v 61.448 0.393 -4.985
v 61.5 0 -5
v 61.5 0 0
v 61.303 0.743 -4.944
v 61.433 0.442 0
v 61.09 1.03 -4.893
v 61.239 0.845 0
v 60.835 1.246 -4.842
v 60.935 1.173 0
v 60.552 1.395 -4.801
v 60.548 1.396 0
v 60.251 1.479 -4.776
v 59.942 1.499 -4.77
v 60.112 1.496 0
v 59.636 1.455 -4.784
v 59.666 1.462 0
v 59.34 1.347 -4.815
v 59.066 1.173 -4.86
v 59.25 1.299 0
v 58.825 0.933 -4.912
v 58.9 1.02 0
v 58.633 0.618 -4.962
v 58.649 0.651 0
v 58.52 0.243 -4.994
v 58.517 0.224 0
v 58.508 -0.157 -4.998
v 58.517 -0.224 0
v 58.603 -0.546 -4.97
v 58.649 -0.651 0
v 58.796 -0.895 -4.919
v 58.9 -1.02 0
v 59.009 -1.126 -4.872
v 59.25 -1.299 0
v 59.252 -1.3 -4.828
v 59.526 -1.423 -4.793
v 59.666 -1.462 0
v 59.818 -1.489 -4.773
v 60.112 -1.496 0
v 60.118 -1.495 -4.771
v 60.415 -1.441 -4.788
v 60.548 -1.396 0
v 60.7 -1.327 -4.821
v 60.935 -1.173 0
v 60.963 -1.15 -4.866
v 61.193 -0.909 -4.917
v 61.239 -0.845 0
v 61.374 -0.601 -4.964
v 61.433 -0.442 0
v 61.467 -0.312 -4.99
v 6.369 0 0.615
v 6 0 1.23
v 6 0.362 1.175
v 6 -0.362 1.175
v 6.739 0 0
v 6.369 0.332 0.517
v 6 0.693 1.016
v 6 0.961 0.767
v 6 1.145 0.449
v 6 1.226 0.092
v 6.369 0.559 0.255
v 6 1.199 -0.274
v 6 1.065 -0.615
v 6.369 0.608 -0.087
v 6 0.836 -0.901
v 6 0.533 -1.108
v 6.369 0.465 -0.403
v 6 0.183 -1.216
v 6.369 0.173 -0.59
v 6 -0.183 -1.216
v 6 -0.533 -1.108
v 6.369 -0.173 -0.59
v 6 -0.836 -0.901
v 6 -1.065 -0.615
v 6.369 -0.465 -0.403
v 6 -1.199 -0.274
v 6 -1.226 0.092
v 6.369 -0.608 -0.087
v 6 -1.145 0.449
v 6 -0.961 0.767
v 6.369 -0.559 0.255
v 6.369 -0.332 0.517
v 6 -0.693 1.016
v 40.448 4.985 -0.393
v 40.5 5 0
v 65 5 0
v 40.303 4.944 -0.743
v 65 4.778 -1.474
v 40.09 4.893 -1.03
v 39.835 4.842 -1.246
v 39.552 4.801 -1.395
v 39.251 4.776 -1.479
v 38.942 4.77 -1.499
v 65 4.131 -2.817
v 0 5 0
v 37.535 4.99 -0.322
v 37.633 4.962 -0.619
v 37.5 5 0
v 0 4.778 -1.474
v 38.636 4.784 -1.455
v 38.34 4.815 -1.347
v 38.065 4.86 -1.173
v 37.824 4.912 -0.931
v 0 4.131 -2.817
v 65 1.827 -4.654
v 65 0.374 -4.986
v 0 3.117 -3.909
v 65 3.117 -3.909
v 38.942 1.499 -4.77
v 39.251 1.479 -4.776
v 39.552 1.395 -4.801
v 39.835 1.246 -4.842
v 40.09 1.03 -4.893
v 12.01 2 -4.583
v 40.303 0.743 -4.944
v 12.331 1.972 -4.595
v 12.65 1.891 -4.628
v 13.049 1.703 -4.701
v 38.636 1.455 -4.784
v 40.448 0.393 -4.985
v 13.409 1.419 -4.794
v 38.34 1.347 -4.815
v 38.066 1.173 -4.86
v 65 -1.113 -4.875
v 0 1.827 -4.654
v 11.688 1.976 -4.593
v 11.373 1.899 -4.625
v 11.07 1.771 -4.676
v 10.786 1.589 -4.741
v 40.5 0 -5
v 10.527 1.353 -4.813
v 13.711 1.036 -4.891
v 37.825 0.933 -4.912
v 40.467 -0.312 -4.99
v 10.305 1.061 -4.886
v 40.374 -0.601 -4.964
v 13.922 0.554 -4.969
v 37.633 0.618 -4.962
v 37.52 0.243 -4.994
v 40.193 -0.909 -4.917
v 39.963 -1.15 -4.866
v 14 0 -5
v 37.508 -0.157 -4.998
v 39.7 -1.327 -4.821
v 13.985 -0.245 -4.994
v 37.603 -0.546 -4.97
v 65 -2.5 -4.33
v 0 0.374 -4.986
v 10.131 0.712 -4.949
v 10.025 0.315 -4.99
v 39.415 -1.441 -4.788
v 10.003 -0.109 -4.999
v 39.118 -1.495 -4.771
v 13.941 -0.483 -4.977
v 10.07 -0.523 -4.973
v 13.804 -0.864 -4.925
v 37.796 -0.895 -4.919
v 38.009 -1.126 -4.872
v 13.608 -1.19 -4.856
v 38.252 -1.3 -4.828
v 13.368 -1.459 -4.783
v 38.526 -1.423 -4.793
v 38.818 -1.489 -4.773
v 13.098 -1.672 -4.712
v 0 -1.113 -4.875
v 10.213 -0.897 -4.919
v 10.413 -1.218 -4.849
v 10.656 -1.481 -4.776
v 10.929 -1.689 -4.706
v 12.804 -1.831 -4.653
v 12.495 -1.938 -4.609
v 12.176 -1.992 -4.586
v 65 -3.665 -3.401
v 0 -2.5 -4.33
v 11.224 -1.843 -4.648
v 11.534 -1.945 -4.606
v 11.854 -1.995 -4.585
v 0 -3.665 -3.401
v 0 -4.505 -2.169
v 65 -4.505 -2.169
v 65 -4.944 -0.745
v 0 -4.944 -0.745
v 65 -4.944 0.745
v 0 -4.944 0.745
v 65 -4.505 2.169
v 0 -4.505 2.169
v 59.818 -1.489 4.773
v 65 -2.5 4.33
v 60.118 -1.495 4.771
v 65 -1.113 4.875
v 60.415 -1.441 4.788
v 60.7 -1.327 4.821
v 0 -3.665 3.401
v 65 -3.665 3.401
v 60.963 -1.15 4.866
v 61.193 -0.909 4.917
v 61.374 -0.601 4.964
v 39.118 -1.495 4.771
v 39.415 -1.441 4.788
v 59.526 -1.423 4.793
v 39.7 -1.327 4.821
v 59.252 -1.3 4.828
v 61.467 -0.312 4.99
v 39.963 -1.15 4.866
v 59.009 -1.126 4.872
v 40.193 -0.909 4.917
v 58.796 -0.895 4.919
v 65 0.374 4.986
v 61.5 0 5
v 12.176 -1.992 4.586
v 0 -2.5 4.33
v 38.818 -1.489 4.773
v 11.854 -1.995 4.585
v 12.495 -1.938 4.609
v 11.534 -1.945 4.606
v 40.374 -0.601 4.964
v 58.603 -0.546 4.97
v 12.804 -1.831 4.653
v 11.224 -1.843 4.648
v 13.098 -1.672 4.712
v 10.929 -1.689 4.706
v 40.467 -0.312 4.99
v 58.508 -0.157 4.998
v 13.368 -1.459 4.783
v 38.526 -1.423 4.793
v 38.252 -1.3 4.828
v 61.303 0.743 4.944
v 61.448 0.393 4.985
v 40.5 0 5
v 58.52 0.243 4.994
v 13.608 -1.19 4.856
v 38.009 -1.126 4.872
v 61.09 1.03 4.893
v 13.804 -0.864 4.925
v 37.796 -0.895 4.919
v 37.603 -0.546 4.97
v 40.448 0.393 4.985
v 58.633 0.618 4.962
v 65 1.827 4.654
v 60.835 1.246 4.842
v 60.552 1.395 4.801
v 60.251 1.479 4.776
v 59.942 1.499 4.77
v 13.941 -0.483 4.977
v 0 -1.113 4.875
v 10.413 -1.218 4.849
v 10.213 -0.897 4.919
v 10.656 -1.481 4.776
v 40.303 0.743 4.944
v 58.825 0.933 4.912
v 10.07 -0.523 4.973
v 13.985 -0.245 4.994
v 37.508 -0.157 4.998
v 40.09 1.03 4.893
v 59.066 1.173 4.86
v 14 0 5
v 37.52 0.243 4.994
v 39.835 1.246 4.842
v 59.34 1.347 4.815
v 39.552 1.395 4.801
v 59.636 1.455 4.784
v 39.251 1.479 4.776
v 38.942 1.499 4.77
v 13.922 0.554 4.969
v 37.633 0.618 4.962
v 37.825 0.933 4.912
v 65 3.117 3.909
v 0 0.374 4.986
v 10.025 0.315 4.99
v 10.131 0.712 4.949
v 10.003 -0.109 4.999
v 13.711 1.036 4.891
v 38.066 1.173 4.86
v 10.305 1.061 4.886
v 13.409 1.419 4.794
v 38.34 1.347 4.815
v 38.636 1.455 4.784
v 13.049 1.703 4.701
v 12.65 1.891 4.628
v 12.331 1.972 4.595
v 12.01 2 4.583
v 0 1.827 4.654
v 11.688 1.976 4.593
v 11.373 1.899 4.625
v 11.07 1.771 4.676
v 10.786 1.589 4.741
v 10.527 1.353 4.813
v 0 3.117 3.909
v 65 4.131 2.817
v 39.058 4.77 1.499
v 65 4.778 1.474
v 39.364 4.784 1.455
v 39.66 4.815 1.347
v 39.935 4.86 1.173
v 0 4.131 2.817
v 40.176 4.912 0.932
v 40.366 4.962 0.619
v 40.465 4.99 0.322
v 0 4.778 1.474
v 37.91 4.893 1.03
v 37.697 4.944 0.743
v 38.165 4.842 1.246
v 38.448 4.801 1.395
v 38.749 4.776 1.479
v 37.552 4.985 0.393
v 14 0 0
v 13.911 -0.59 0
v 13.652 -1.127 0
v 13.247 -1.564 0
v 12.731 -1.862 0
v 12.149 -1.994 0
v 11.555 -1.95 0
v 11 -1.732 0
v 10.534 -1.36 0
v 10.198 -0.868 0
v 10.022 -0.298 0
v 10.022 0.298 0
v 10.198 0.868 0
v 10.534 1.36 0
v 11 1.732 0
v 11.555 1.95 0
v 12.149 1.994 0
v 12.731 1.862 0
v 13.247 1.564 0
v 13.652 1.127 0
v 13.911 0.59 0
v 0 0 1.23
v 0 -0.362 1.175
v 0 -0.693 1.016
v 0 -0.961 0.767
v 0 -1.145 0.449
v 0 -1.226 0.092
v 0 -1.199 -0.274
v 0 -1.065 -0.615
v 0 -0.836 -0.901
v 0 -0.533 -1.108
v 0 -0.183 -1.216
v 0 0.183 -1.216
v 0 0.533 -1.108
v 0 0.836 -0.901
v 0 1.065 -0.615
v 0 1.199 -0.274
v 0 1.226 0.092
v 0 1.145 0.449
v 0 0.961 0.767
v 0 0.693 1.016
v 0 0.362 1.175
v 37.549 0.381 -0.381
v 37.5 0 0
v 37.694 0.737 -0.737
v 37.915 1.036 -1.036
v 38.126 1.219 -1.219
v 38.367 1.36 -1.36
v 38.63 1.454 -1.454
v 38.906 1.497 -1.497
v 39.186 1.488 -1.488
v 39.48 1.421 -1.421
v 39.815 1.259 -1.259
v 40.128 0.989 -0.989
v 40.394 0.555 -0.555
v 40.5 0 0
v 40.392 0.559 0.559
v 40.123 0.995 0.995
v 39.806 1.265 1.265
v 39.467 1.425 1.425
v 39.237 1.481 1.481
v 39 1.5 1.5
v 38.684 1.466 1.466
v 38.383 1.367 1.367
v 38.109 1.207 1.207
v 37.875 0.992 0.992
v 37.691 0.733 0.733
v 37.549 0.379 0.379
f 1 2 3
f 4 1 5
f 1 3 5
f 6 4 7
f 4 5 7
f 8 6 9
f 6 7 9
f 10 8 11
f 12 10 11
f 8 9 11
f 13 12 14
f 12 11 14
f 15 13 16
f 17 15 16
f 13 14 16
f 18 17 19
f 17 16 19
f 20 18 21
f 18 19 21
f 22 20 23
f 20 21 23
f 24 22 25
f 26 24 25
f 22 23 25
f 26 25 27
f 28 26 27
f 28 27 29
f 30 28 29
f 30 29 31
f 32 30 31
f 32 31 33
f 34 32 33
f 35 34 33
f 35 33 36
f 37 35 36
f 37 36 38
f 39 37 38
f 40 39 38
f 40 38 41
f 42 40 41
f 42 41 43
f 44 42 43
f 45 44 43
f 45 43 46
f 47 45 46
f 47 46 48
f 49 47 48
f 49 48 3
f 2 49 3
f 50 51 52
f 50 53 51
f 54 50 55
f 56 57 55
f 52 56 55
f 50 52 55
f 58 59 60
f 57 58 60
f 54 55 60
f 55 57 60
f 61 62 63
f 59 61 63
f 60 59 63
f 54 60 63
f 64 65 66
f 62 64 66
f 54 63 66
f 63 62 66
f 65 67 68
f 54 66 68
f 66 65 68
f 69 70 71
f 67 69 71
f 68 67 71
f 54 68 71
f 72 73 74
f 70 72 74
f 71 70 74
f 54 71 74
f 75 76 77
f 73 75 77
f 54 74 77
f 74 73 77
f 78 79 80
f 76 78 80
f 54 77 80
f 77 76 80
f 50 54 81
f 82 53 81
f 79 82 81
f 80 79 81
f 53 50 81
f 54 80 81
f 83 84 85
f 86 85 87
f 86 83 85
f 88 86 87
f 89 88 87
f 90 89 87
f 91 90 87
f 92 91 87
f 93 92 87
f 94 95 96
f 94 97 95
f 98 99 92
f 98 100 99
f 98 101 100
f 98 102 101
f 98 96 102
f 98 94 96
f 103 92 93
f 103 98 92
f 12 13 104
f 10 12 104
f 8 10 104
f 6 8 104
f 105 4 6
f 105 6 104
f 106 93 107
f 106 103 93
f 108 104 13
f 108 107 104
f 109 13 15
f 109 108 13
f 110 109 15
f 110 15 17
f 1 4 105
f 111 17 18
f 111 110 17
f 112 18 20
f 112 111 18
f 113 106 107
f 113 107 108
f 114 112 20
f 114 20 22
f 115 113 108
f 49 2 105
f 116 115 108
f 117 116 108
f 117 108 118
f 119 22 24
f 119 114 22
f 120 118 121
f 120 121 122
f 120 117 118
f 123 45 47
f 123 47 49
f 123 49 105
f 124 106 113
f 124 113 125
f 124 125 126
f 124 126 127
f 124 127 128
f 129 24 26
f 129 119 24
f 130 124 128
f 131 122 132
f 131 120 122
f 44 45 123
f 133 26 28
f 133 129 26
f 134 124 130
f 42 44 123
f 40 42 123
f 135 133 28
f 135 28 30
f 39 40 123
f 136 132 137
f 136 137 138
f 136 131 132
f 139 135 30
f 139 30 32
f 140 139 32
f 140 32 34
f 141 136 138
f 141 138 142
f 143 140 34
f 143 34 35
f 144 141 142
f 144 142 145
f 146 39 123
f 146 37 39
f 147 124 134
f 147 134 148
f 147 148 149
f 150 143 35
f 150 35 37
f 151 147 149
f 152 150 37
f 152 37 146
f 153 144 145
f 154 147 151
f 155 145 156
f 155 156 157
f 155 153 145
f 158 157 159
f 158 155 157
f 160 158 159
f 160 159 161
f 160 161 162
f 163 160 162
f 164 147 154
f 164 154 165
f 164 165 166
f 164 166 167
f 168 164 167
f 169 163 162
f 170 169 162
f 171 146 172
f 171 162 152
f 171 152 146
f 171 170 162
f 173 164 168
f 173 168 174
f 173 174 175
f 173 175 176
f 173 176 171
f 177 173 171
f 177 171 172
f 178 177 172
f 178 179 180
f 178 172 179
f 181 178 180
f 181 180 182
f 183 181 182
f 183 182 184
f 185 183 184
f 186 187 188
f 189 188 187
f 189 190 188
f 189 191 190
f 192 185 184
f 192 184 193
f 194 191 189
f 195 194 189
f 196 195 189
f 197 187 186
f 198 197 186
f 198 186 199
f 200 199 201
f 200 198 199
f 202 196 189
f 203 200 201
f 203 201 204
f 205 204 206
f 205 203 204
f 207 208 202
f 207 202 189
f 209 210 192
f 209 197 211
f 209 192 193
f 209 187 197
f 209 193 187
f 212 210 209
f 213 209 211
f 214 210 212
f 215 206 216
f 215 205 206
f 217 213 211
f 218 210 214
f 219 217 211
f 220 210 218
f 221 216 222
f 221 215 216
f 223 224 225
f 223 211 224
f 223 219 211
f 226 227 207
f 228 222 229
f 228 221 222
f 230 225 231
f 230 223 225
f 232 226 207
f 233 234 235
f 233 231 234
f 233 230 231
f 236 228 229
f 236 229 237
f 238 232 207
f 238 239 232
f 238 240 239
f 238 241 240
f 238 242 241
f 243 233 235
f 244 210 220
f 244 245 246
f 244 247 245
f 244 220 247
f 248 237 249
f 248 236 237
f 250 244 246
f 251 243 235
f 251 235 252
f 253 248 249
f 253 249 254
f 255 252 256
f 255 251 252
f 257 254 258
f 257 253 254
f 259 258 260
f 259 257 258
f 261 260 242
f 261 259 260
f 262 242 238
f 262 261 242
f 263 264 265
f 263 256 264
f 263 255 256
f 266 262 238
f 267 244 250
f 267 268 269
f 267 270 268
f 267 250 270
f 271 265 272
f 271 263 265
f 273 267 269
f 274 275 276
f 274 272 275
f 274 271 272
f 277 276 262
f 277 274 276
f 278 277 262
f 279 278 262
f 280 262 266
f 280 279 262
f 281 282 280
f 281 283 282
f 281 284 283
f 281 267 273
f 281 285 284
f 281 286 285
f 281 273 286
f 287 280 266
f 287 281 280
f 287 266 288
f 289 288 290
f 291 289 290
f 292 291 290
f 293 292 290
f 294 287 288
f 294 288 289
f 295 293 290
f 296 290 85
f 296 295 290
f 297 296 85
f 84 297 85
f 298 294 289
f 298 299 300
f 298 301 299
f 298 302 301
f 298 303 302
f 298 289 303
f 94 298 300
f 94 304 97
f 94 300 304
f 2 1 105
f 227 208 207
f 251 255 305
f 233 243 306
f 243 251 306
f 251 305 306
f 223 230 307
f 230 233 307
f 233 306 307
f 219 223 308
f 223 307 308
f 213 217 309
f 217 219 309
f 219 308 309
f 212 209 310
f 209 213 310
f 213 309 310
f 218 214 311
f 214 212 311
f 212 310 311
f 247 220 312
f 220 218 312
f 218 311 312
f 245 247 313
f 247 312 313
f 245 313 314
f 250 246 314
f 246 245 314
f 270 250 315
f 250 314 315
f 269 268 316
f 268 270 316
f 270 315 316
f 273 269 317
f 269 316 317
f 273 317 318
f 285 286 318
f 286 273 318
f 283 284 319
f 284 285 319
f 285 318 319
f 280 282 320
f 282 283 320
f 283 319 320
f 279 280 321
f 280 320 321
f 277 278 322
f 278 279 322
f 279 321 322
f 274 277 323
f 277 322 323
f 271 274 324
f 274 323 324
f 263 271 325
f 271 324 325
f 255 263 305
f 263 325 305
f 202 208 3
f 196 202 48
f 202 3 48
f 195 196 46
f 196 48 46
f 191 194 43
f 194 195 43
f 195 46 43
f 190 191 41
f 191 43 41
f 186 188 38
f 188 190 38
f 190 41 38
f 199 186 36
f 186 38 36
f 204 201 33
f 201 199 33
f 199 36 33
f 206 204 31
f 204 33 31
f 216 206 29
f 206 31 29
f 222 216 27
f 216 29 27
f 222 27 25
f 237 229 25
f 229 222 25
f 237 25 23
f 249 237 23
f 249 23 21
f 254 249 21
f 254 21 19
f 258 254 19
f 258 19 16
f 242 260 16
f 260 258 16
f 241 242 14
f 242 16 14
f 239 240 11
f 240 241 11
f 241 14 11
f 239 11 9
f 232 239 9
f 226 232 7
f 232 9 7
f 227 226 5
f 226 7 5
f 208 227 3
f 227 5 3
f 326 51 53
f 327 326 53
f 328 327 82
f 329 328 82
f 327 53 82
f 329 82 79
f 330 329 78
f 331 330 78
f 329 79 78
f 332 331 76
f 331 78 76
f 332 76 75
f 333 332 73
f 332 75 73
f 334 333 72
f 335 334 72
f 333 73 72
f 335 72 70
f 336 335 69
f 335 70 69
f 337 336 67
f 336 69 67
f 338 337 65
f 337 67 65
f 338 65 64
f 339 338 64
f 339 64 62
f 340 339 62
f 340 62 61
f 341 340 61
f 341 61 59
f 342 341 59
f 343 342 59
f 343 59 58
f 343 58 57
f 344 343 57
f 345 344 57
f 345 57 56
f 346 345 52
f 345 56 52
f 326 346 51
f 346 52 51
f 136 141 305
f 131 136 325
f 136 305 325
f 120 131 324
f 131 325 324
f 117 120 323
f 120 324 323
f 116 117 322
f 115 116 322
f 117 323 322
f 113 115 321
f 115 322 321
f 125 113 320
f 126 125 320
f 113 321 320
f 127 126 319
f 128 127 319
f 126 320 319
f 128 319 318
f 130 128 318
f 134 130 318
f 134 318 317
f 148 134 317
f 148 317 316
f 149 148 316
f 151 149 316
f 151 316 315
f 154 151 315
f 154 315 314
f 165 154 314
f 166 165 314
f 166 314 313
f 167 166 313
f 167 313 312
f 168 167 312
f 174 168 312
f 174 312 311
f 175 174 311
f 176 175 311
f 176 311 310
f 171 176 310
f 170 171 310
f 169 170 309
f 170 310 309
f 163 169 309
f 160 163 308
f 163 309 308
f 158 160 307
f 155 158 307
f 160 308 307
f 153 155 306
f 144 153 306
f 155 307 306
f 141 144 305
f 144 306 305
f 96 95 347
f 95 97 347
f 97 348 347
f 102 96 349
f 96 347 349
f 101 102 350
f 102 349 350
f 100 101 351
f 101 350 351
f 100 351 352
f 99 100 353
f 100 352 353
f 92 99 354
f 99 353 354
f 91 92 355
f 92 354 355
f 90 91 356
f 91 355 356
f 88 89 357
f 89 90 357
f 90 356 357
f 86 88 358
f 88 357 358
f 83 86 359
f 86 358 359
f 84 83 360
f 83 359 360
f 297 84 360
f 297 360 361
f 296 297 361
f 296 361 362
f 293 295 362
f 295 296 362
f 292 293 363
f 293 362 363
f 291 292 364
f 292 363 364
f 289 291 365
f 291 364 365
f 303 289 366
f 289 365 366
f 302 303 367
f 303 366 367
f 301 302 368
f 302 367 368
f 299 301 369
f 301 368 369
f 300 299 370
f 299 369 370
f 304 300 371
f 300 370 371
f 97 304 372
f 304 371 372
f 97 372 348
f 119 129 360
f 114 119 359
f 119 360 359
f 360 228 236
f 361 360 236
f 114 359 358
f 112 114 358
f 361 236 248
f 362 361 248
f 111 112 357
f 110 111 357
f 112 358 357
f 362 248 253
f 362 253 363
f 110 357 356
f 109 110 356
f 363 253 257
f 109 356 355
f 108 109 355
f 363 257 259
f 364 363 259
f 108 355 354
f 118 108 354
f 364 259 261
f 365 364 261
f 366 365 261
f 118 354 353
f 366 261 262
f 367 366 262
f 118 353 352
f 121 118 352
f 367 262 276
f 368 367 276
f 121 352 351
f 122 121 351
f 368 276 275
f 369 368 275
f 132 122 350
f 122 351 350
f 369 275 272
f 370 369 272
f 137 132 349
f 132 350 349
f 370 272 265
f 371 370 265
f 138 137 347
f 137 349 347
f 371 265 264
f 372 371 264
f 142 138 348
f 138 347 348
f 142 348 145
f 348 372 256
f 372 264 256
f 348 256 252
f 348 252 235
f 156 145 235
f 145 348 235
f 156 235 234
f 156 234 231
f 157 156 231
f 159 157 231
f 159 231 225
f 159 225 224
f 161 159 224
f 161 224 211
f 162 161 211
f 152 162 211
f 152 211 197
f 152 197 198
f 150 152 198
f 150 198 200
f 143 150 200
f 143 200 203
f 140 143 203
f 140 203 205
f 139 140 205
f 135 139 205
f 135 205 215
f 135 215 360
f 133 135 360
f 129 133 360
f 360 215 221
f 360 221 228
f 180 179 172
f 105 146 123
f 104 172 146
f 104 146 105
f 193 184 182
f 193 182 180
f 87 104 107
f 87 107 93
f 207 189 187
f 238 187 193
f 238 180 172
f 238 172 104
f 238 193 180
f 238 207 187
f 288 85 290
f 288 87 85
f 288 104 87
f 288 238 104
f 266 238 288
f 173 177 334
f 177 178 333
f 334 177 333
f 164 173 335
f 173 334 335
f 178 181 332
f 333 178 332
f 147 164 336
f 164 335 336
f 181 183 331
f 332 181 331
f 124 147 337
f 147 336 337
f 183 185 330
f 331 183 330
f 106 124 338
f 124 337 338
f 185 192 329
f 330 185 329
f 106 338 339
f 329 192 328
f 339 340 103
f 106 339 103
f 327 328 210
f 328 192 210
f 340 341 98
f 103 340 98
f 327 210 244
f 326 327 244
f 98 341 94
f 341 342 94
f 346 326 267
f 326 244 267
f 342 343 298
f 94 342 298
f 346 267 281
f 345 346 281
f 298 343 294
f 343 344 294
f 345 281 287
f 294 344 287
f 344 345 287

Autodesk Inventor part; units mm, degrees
ref_plane "YZ Plane" through (0, 0, 0) normal (1, 0, 0) x (0, 1, 0)
ref_plane "XZ Plane" through (0, 0, 0) normal (0, 1, 0) x (-1, 0, 0)
ref_plane "XY Plane" through (0, 0, 0) normal (0, 0, 1) x (1, 0, 0)
sketch "Эскиз1" plane through (0, 0, 0) normal (1, 0, 0) x (0, 1, 0)
  circle A0 centre (0, 0) radius 5
  dimension "d0" = 10
extrude "Выдавливание1" add sketch "Эскиз1" along normal blind 65
sketch "Эскиз2" plane through (0, 0, 0) normal (0, 0, 1) x (1, 0, 0)
  line L0 (0, 0) -> (12, 0)
  circle A0 centre (12, 0) radius 2
  line L1 (12, 0) -> (29, 0)
  line L2 (29, 0) -> (39, 0)
  circle A1 centre (39, 0) radius 1.5
  dimension "d3" = 12
  dimension "d4" = 4
  dimension "d5" = 17
  dimension "d6" = 10
  dimension "d7" = 3
extrude "Выдавливание2" cut sketch "Эскиз2" along normal mid plane 15.25
sketch "Эскиз3" plane through (0, 0, 0) normal (0, 1, 0) x (-1, 0, 0)
  line L0 (-40.5, -5) -> (-40.5, 5) projected
  line L1 (-37.5, -5) -> (-37.5, 5) projected
  line L2 (-37.5, 0) -> (-40.5, 0)
  circle A0 centre (-39, 0) radius 1.5
  point P0 (0, 0)
  dimension "d10" = 3
extrude "Выдавливание3" cut sketch "Эскиз3" along normal blind 15
thread "Резьба1" size "M3x0.5" class "6H" standard "ISO Metric profile" full length
thread "Резьба2" size "M3x0.5" class "6H" standard "ISO Metric profile" full length
sketch "Эскиз4" plane through (0, 0, 0) normal (0, 0, 1) x (1, 0, 0)
  line L0 (65, -5) -> (65, 5) projected
  line L1 (65, 0) -> (60, 0)
  circle A0 centre (60, 0) radius 1.5
  point P0 (0, 0)
  dimension "d17" = 5
  dimension "d18" = 3
extrude "Выдавливание4" cut sketch "Эскиз4" along normal mid plane 21.25
thread "Резьба3" size "M3x0.5" class "6H" standard "ANSI Metric M Profile" full length
sketch "Эскиз5" plane through (0, 0, 0) normal (-1, 0, 0) x (0, 0, 1)
  point P0 (0, 0)
  point P1 (0, 0)
hole "Отверстие1" at (0, 0, 0) direction (1, 0, 0) diameter 2.459 depth 6 tip angle 118 thread size "M3x0.5" class "6H" standard "ISO Metric profile"
properties part number "Вал ручки"
